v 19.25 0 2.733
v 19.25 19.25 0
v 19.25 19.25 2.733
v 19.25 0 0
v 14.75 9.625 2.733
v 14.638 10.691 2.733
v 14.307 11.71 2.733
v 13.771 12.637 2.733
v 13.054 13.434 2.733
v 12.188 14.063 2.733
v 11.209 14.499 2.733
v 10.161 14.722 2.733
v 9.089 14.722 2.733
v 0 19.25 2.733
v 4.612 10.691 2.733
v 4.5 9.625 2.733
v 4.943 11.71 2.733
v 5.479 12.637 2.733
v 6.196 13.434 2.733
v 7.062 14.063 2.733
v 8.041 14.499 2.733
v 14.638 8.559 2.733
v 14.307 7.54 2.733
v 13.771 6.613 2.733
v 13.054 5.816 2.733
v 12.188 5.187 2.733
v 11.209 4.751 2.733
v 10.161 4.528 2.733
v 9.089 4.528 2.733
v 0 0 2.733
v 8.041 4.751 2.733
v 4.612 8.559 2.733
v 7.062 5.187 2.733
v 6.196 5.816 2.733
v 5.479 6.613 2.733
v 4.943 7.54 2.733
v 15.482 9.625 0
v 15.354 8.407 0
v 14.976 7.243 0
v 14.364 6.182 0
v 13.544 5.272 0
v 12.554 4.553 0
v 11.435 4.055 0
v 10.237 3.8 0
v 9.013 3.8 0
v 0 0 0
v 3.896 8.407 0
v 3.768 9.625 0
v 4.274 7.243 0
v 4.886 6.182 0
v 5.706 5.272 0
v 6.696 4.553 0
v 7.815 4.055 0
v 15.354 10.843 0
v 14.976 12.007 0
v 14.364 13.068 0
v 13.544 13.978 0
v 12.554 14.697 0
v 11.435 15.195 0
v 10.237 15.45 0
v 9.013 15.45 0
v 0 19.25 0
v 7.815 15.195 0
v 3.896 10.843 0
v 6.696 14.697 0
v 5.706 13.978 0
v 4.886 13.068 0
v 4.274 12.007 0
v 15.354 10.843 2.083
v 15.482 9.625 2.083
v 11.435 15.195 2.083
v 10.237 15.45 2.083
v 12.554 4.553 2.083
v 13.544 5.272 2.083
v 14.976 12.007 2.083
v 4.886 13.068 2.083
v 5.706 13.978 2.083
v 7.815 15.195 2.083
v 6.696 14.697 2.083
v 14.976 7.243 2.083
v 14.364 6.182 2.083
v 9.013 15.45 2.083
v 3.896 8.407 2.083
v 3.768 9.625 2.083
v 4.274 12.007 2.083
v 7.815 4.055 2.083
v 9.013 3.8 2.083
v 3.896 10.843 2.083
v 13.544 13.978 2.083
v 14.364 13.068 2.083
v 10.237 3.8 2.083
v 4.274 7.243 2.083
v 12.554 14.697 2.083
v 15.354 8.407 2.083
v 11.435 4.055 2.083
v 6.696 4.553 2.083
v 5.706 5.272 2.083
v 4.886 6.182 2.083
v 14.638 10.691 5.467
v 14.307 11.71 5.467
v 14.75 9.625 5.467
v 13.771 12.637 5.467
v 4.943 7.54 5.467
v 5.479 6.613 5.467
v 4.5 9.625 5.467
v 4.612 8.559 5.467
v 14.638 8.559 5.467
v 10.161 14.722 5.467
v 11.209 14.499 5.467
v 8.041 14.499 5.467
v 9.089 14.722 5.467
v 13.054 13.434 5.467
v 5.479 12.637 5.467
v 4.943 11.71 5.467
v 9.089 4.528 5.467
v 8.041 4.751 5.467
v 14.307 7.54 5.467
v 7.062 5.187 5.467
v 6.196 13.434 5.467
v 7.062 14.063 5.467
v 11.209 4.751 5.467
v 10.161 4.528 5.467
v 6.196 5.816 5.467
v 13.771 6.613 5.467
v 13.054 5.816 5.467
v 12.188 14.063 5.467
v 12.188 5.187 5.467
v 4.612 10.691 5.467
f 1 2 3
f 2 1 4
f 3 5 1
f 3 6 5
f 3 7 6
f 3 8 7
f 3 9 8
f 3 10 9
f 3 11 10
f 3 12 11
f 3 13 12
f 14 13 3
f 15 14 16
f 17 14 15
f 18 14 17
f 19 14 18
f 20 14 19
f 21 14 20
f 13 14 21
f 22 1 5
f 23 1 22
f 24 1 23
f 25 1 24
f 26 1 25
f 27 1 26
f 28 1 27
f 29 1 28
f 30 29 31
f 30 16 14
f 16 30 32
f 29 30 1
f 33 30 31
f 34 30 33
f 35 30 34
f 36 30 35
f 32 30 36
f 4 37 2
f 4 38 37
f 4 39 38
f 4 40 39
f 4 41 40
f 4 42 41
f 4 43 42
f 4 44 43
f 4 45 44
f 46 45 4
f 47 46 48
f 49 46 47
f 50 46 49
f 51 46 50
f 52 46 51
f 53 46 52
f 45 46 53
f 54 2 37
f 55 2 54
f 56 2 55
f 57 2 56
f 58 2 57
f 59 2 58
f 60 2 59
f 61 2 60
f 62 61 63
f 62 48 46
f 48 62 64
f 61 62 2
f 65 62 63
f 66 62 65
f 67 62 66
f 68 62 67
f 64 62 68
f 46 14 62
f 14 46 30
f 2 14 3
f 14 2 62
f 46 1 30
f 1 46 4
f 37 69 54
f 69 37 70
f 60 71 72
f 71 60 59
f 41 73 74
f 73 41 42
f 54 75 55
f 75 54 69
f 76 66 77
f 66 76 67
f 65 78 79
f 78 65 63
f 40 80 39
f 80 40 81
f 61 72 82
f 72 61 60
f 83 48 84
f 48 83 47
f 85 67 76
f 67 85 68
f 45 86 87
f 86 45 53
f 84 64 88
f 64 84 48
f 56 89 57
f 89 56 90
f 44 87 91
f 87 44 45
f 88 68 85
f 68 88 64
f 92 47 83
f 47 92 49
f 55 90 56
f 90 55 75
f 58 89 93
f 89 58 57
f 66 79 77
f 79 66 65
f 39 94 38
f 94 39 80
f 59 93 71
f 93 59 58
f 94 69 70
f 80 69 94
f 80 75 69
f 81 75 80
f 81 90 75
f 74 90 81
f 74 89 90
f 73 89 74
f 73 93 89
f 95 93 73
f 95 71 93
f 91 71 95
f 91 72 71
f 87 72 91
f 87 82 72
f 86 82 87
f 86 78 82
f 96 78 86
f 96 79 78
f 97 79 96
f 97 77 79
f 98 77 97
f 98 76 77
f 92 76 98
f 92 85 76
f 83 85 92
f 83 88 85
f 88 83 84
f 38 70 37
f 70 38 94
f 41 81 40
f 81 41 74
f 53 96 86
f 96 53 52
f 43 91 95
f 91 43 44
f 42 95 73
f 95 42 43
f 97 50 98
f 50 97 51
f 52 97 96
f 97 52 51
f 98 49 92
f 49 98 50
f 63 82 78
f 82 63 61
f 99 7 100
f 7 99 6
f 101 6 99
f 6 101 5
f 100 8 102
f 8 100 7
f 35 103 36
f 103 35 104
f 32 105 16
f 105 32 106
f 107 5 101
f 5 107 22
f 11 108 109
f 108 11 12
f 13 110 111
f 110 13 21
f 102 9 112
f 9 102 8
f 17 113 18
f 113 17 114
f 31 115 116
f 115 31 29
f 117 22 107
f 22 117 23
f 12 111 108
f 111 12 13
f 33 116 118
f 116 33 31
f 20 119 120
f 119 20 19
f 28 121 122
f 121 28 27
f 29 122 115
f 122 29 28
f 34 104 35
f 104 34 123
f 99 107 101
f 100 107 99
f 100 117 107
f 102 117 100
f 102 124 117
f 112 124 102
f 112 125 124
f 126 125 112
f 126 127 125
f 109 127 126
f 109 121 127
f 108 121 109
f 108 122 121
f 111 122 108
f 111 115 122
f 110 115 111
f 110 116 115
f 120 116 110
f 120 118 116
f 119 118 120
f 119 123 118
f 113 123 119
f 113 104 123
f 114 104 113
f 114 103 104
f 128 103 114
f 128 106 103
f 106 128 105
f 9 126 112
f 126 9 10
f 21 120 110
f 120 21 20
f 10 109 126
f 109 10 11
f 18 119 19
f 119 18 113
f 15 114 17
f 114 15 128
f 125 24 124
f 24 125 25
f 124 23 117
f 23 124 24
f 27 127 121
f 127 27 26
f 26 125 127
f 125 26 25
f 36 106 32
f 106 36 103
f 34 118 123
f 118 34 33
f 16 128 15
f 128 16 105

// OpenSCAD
coldiameter = 17.5;
mod = coldiameter;
colheight = 82;
colid = 10.25;  			    //inner (open) diameter of column
colih = 1.5;				   // height of boss for column
length = colheight * .618;  // for golden rectangle
height = colheight/15;
width = coldiameter * 1.0;  //allows over or under hang if desired
angle = 1;

f_overhang = 2;			  //frieze overhang
f_height = height*2;		  //frieze height
f_d = .03; 					// amount of triglyph inset

c_overhang = 2;			  //cornice overhang
c_height = height *2/3;		  //cornice height
c_length = length;

abacus();
//multi_abacus();
//beam();
//corner();
//qr();
//tri();
//frieze_beam(2); 		  // parmeter is number of trigliphs
//frieze_corner();
//rotate([180,0,0]) translate([0,-18,-f_height-c_height]) {cornice_beam();}
//cornice_beam(1);
//cornice_corner();


module cornice_corner() {

}

module cornice_beam(type) {
	if ( type == 0 ) {
		cube([c_length,width+c_overhang,c_height]);
		}
	if ( type == 1 ) {
		cube([c_length*.75,width+c_overhang,c_height]);
		}
	
	translate([length*.065,width/6.5,c_height])
		cube([length/2-(length*.125),width-(width*.25),c_height/1.5]);

		if (type == 0 ) {
		translate([length/2 + (length*.065),width/6.5,c_height])
			cube([length/2-(length*.125),width-(width*.25),c_height/1.5]);
		}
		if (type == 1 ){
		translate([length/2 + (length*.055),width/6.5,c_height])
			cube([length/2-(length*.312),width-(width*.25),c_height/1.5]);
		}

}


module frieze_corner() {
	union() {	
	difference() {
	cube([length/2+coldiameter/4,width,f_height]);
	translate([length/25,width/10,height/10])
		cube([length/2+coldiameter/4-length/12,width-width/5,f_height]);
	translate([width/2,width/2,0])
		cylinder(h = height/2, r = width/8, $fs = angle);
	}
	//translate([width-length/20,0,0])  cube([length/25,width,f_height]);
	rotate([0,90,0]) {
		qr(length/2+coldiameter/4);
	}
	translate([0,-f_height/12,f_height*.7]) cube([length/2+coldiameter/4,f_height/12,f_height/6]);
	translate([0,0,f_height]) rotate([90.001,0,90])  {
		qr(length/2+coldiameter/4);
	}
	translate([coldiameter/4,-f_height/10,0])
		tri();
	//translate([(length/4)*2+(length/10),-f_height/15,0])
	//	tri();
	}
	union() {
	difference() {
	cube([width,(length/2)+(coldiameter*.75),f_height]);
	translate([width/10,length/30,height/10])
		cube([width-width/5,(length/2)+(coldiameter*.75)-length/15,f_height]);
	translate([width/2,width/2,0])
		cylinder(h = height/2, r = width/8, $fs = angle);
//	translate([width/2,3*length/4,0])
//		cylinder(h = height/2, r = width/8, $fs = angle);	
	}
	//translate([0,width-length/20,0])  cube([length/20,width,f_height]);
	translate([0,length/1.317,0]) rotate([90,90,0]) {
		qr(((length/2)+coldiameter*.79));
	}
	translate([0,-length*.015,f_height]) rotate([180.001,270,90])  {
		qr(((length/2)+coldiameter*.79));
	}
	translate([-f_height/12,-f_height/12,f_height*.7]) cube([f_height/12,length/2+coldiameter*.75+f_height/12,f_height/6]);
	translate([-f_height/10,coldiameter*.76,0]) rotate([0,0,270])
		tri();
	translate([-f_height/10,length-(coldiameter*.7),0]) rotate([0,0,270])
		tri();
	}
}


module frieze_beam(number) {
union() {
	difference() {
	cube([length,width,f_height]);
	translate([length/20,width/10,height/10])
		cube([length-length/10,width-width/5,f_height]);
	translate([length/4,width/2,0])
			cylinder(h = height/2, r = width/8, $fs = angle);
	translate([3*length/4,width/2,0])
			cylinder(h = height/2, r = width/8, $fs = angle);	}
	translate([length/2-length/20,0,0])  cube([length/10,width,f_height]);
	rotate([0,90,0]) {
		qr(length);
	}
	translate([0,0,f_height]) rotate([90.001,0,90])  {
		qr(length);
	}
//	translate([0,width,0]) rotate([90,180,90])  {
//		qr(length);
//	}
//	translate([0,width,f_height]) rotate([90,270,90])  {
//		qr(length);
//	}
#translate([0,-f_height/12,f_height*.7]) cube([length,f_height/12,f_height/6]);
if ( number == 3 ) {
	translate([0,-f_height/15,0])
		tri();
	translate([(length/5)*2,-f_height/15,0])
		tri();
	translate([(length/5)*4,-f_height/15,0])
		tri();
	}
else if ( number == 2 ){
	translate([(length/4)*0,-f_height/10,0])
		tri();
	translate([(length/4)*2,-f_height/10,0])
		tri();
	}
}
}


module qr(len) {

	difference() {
		cylinder(h = len, r = f_height/6, $fs = angle);
		translate([-f_height/3,0,0])
			cube([f_height/2.5,f_height/4,len]);
		translate([0,-f_height/4,0])
			cube([f_height/4,f_height/2,len]);
		}
}

module tri() {
	difference() {

		translate([0,0,f_height/7])
			cube([coldiameter/2,f_height/10,f_height-f_height/3]);					//basic plate shape
		translate([0,-f_height*f_d,0])
			scale([1,1.5,1]) cylinder(r = coldiameter*.05, h = f_height-f_height/6, $fs = .05);	//left half groove
		translate([coldiameter*.167,-f_height*f_d,0])
			scale([1,1.5,1]) cylinder(r = coldiameter*.05, h = f_height-f_height/6, $fs = .05);	//left full groove
		translate([coldiameter*.333,-f_height*f_d,0])
			scale([1,1.5,1]) cylinder(r = coldiameter*.05, h = f_height-f_height/6, $fs = .05);	//right full groove
		translate([coldiameter/2,-f_height*f_d,0])
			scale([1,1.5,1]) cylinder(r = coldiameter*.05, h = f_height-f_height/6, $fs = .05);	//right half groove
		}
	translate([0,-f_height/20,f_height*.7])
		cube([coldiameter/2,f_height/7,f_height/7]);
}

module beam() {
	difference() {
		cube([length, width, height]);
		translate([length/4,width/2,0])
			# cylinder(h = height/2, r = width/8, $fs = angle);
		translate([3*length/4,width/2,0])
			# cylinder(h = height/2, r = width/8, $fs = angle);		}
	difference() {
		translate([0,width/2,0])
			cylinder(h = (height + colih), r = colid/2, $fs = angle);
		translate([-colid/2,0,0])
			cube([colid/2,width,height*2]);
		}
	difference() {
		translate([length,width/2,0])
			cylinder(h = (height + colih), r = colid/2, $fs = angle);
		translate([length,0,0])
			cube([colid/2,width,height*2]);
		}
}

module corner() {
	difference() {
		cube([length+width/2, width, height]);
		translate([width/2,width/2,0])
			cylinder(h = height/2, r = width/8, $fs = angle);
		translate([3*(length+width/2)/4,width/2,0])
			cylinder(h = height/2, r = width/8, $fs = angle);	
		}
	difference() {
		translate([0,width,0])
			cube([width, length-width/2, height]);
		translate([width/2,3*(length+width/2)/4,0])
			cylinder(h = height/2, r = width/8, $fs = angle);
		}
	translate([width/2,width/2,height/2])
		cylinder(h = (height/2 + colih), r = colid/2, $fs = angle);
	difference() {
		translate([length+width/2,width/2,0])
			cylinder(h = (height + colih), r = colid/2, $fs = angle);
		translate([length+width/2,0,0])
			cube([colid/2,width,height*2]);
		}
	difference() {
		translate([width/2,length+width/2,0])
			cylinder(h = (height + colih), r = colid/2, $fs = angle);
		translate([0,length+width/2,0])
			cube([width,colid/2,height*2]);
		}
}

module abacus() {
	translate([(width*1.1)/2,(width*1.1)/2,height/2])
		cylinder(h = height/2, r = colid/2, $fs = angle);
	difference() {
		cube([width*1.1,width*1.1,height/2]);
		translate([(width*1.1)/2,(width*1.1)/2,0])
			cylinder(h = (height/2)-.65, r =colid/1.75, $fs = angle);
		}
}

module multi_abacus() {
abacus();
translate([width*1.5,0,0])
	abacus();
translate([0,width*1.5,0])
	abacus();
translate([width*1.5,width*1.5,0])
	abacus();
}
